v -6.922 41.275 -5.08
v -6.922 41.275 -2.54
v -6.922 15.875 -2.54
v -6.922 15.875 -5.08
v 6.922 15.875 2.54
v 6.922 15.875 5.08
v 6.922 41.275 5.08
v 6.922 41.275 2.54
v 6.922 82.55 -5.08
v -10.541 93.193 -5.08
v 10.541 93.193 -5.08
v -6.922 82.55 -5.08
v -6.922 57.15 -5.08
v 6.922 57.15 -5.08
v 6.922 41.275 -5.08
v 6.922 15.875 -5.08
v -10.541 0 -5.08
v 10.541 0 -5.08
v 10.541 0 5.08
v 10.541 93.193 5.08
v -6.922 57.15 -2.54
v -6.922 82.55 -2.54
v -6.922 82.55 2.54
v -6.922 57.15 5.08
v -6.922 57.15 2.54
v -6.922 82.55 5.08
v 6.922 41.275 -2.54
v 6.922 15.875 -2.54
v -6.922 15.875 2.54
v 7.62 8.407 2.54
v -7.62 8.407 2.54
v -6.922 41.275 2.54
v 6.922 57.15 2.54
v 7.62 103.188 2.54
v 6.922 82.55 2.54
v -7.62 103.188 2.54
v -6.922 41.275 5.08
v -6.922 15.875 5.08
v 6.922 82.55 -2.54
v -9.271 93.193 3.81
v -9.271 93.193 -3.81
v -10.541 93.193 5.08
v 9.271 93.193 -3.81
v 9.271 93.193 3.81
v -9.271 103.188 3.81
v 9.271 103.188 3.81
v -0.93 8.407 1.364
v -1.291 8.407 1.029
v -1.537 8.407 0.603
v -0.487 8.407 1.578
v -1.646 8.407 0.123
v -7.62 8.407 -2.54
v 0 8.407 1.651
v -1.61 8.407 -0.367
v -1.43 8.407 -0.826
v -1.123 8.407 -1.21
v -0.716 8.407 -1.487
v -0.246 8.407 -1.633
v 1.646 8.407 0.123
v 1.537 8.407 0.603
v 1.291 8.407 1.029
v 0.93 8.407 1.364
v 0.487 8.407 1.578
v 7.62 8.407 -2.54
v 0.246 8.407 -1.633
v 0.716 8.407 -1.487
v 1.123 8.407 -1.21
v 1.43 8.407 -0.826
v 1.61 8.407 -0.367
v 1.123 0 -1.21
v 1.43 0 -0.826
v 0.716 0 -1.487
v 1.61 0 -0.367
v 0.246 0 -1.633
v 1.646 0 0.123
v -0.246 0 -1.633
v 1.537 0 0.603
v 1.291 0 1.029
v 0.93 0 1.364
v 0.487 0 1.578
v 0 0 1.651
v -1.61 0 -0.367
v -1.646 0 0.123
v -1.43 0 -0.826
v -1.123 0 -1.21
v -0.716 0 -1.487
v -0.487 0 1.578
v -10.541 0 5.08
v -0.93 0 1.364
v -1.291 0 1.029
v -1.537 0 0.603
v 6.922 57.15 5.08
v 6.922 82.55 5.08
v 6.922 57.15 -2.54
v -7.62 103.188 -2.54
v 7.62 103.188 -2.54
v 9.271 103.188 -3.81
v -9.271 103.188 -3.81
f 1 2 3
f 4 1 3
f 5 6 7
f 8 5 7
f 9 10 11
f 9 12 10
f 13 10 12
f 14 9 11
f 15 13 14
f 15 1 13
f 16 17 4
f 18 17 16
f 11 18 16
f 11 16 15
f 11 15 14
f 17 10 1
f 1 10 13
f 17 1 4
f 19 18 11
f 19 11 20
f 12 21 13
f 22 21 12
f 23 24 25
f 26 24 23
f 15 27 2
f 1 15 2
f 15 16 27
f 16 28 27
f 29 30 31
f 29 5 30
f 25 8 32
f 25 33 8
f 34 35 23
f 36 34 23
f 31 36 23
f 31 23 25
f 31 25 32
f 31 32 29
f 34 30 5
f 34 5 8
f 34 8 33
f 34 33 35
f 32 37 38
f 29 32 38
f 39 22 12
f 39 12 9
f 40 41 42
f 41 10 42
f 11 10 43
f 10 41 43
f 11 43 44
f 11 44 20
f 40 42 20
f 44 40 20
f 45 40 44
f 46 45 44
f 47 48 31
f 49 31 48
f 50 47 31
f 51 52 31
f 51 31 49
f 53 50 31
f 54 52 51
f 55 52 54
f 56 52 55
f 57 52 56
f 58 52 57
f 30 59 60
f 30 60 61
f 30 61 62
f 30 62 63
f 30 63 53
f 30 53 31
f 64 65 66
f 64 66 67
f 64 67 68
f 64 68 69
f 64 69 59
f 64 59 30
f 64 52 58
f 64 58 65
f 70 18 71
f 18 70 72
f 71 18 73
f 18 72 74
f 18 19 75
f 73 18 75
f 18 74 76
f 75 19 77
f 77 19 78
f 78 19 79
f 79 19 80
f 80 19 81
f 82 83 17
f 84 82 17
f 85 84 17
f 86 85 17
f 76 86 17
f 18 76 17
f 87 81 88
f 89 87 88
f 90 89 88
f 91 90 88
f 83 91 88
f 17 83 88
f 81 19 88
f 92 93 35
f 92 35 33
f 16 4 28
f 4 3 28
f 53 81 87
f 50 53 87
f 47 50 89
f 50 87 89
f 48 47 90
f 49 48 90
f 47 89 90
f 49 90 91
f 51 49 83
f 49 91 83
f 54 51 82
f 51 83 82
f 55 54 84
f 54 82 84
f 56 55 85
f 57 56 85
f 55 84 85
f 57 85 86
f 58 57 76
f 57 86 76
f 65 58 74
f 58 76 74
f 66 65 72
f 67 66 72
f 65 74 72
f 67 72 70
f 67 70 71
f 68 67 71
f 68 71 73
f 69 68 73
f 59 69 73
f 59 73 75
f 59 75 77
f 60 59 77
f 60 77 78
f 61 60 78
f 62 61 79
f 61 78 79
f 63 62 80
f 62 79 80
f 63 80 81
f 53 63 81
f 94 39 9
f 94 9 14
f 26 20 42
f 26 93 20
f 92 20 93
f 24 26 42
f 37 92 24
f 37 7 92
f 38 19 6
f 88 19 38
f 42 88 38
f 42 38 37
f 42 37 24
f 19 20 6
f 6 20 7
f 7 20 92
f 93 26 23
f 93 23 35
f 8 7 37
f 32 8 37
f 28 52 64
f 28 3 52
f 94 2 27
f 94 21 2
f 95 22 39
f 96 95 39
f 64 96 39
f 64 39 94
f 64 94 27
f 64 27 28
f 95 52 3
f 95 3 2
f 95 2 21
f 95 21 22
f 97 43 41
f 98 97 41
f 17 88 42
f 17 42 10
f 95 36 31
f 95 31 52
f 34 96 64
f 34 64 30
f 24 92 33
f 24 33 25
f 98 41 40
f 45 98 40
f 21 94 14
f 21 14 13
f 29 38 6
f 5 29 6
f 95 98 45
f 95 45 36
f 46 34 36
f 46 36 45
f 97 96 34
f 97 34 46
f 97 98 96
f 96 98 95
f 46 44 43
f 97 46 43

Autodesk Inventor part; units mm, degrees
ref_plane "YZ Plane" through (0, 0, 0) normal (1, 0, 0) x (0, 1, 0)
ref_plane "XZ Plane" through (0, 0, 0) normal (0, 1, 0) x (-1, 0, 0)
ref_plane "XY Plane" through (0, 0, 0) normal (0, 0, 1) x (1, 0, 0)
sketch "Sketch2" plane through (0, 0, 0) normal (0, 1, 0) x (-1, 0, 0)
  line L0 (9.271, 3.81) -> (-9.271, 3.81)
  line L1 (-9.271, 3.81) -> (-9.271, -3.81)
  line L2 (-9.271, -3.81) -> (9.271, -3.81)
  line L3 (9.271, -3.81) -> (9.271, 3.81)
  line L4 (9.271, 3.81) -> (-9.271, -3.81) construction
  line L5 (-9.271, 3.81) -> (9.271, -3.81) construction
  point P0 (0, 0)
  dimension "d3" = 18.542
  dimension "d4" = 7.62
extrude "Extrusion2" add sketch "Sketch2" along normal blind 114.3
sketch "Sketch3" plane through (0, 114.3, 0) normal (0, 1, 0) x (1, 0, 0)
  point P0 (0, 0)
sketch "Sketch4" plane through (0, 0, 0) normal (0, -1, 0) x (1, 0, 0)
  line L0 (-10.541, -5.08) -> (10.541, -5.08)
  line L1 (10.541, -5.08) -> (10.541, 5.08)
  line L2 (10.541, 5.08) -> (-10.541, 5.08)
  line L3 (-10.541, 5.08) -> (-10.541, -5.08)
  line L4 (-10.541, -5.08) -> (10.541, 5.08) construction
  line L5 (10.541, -5.08) -> (-10.541, 5.08) construction
  point P0 (0, 0)
  dimension "d7" = 21.082
  dimension "d8" = 10.16
extrude "Extrusion3" add sketch "Sketch4" against normal blind 93.1926
hole "Hole1" at (0, 114.3, 0) direction (0, -1, 0) diameter 3.302 end through all
sketch "Sketch5" plane through (0, 114.3, 0) normal (0, 1, 0) x (1, 0, 0)
  line L0 (7.62, -2.54) -> (-7.62, -2.54)
  line L1 (-7.62, -2.54) -> (-7.62, 2.54)
  line L2 (-7.62, 2.54) -> (7.62, 2.54)
  line L3 (7.62, 2.54) -> (7.62, -2.54)
  line L4 (7.62, -2.54) -> (-7.62, 2.54) construction
  line L5 (-7.62, -2.54) -> (7.62, 2.54) construction
  point P0 (0, 0)
  dimension "d18" = 15.24
  dimension "d19" = 5.08
extrude "Extrusion4" cut sketch "Sketch5" against normal blind 105.8926
sketch "Sketch6" plane through (0, 114.3, 0) normal (0, 1, 0) x (1, 0, 0)
  line L0 (14.2875, -6.35) -> (-14.2875, -6.35)
  line L1 (-14.2875, -6.35) -> (-14.2875, 6.35)
  line L2 (-14.2875, 6.35) -> (14.2875, 6.35)
  line L3 (14.2875, 6.35) -> (14.2875, -6.35)
  line L4 (14.2875, -6.35) -> (-14.2875, 6.35) construction
  line L5 (-14.2875, -6.35) -> (14.2875, 6.35) construction
  point P0 (0, 0)
extrude "Extrusion5" cut sketch "Sketch6" against normal blind 11.1125
sketch "Sketch7" plane through (-10.541, 0, 5.08) normal (0, 0, 1) x (1, 0, 0)
  line L0 (3.6195, 82.55) -> (17.4625, 82.55)
  line L1 (17.4625, 82.55) -> (17.4625, 57.15)
  line L2 (17.4625, 57.15) -> (3.6195, 57.15)
  line L3 (3.6195, 57.15) -> (3.6195, 82.55)
  line L4 (3.6195, 82.55) -> (17.4625, 57.15) construction
  line L5 (17.4625, 82.55) -> (3.6195, 57.15) construction
  line L6 (3.6195, 15.875) -> (17.4625, 15.875)
  line L7 (17.4625, 15.875) -> (17.4625, 41.275)
  line L8 (17.4625, 41.275) -> (3.6195, 41.275)
  line L9 (3.6195, 41.275) -> (3.6195, 15.875)
  line L10 (3.6195, 15.875) -> (17.4625, 41.275) construction
  line L11 (17.4625, 15.875) -> (3.6195, 41.275) construction
  point P0 (10.541, 0)
  point P1 (10.541, 69.85)
  point P2 (10.541, 28.575)
extrude "Extrusion6" cut sketch "Sketch7" against normal blind 25.4
properties part number "Pizza2"
